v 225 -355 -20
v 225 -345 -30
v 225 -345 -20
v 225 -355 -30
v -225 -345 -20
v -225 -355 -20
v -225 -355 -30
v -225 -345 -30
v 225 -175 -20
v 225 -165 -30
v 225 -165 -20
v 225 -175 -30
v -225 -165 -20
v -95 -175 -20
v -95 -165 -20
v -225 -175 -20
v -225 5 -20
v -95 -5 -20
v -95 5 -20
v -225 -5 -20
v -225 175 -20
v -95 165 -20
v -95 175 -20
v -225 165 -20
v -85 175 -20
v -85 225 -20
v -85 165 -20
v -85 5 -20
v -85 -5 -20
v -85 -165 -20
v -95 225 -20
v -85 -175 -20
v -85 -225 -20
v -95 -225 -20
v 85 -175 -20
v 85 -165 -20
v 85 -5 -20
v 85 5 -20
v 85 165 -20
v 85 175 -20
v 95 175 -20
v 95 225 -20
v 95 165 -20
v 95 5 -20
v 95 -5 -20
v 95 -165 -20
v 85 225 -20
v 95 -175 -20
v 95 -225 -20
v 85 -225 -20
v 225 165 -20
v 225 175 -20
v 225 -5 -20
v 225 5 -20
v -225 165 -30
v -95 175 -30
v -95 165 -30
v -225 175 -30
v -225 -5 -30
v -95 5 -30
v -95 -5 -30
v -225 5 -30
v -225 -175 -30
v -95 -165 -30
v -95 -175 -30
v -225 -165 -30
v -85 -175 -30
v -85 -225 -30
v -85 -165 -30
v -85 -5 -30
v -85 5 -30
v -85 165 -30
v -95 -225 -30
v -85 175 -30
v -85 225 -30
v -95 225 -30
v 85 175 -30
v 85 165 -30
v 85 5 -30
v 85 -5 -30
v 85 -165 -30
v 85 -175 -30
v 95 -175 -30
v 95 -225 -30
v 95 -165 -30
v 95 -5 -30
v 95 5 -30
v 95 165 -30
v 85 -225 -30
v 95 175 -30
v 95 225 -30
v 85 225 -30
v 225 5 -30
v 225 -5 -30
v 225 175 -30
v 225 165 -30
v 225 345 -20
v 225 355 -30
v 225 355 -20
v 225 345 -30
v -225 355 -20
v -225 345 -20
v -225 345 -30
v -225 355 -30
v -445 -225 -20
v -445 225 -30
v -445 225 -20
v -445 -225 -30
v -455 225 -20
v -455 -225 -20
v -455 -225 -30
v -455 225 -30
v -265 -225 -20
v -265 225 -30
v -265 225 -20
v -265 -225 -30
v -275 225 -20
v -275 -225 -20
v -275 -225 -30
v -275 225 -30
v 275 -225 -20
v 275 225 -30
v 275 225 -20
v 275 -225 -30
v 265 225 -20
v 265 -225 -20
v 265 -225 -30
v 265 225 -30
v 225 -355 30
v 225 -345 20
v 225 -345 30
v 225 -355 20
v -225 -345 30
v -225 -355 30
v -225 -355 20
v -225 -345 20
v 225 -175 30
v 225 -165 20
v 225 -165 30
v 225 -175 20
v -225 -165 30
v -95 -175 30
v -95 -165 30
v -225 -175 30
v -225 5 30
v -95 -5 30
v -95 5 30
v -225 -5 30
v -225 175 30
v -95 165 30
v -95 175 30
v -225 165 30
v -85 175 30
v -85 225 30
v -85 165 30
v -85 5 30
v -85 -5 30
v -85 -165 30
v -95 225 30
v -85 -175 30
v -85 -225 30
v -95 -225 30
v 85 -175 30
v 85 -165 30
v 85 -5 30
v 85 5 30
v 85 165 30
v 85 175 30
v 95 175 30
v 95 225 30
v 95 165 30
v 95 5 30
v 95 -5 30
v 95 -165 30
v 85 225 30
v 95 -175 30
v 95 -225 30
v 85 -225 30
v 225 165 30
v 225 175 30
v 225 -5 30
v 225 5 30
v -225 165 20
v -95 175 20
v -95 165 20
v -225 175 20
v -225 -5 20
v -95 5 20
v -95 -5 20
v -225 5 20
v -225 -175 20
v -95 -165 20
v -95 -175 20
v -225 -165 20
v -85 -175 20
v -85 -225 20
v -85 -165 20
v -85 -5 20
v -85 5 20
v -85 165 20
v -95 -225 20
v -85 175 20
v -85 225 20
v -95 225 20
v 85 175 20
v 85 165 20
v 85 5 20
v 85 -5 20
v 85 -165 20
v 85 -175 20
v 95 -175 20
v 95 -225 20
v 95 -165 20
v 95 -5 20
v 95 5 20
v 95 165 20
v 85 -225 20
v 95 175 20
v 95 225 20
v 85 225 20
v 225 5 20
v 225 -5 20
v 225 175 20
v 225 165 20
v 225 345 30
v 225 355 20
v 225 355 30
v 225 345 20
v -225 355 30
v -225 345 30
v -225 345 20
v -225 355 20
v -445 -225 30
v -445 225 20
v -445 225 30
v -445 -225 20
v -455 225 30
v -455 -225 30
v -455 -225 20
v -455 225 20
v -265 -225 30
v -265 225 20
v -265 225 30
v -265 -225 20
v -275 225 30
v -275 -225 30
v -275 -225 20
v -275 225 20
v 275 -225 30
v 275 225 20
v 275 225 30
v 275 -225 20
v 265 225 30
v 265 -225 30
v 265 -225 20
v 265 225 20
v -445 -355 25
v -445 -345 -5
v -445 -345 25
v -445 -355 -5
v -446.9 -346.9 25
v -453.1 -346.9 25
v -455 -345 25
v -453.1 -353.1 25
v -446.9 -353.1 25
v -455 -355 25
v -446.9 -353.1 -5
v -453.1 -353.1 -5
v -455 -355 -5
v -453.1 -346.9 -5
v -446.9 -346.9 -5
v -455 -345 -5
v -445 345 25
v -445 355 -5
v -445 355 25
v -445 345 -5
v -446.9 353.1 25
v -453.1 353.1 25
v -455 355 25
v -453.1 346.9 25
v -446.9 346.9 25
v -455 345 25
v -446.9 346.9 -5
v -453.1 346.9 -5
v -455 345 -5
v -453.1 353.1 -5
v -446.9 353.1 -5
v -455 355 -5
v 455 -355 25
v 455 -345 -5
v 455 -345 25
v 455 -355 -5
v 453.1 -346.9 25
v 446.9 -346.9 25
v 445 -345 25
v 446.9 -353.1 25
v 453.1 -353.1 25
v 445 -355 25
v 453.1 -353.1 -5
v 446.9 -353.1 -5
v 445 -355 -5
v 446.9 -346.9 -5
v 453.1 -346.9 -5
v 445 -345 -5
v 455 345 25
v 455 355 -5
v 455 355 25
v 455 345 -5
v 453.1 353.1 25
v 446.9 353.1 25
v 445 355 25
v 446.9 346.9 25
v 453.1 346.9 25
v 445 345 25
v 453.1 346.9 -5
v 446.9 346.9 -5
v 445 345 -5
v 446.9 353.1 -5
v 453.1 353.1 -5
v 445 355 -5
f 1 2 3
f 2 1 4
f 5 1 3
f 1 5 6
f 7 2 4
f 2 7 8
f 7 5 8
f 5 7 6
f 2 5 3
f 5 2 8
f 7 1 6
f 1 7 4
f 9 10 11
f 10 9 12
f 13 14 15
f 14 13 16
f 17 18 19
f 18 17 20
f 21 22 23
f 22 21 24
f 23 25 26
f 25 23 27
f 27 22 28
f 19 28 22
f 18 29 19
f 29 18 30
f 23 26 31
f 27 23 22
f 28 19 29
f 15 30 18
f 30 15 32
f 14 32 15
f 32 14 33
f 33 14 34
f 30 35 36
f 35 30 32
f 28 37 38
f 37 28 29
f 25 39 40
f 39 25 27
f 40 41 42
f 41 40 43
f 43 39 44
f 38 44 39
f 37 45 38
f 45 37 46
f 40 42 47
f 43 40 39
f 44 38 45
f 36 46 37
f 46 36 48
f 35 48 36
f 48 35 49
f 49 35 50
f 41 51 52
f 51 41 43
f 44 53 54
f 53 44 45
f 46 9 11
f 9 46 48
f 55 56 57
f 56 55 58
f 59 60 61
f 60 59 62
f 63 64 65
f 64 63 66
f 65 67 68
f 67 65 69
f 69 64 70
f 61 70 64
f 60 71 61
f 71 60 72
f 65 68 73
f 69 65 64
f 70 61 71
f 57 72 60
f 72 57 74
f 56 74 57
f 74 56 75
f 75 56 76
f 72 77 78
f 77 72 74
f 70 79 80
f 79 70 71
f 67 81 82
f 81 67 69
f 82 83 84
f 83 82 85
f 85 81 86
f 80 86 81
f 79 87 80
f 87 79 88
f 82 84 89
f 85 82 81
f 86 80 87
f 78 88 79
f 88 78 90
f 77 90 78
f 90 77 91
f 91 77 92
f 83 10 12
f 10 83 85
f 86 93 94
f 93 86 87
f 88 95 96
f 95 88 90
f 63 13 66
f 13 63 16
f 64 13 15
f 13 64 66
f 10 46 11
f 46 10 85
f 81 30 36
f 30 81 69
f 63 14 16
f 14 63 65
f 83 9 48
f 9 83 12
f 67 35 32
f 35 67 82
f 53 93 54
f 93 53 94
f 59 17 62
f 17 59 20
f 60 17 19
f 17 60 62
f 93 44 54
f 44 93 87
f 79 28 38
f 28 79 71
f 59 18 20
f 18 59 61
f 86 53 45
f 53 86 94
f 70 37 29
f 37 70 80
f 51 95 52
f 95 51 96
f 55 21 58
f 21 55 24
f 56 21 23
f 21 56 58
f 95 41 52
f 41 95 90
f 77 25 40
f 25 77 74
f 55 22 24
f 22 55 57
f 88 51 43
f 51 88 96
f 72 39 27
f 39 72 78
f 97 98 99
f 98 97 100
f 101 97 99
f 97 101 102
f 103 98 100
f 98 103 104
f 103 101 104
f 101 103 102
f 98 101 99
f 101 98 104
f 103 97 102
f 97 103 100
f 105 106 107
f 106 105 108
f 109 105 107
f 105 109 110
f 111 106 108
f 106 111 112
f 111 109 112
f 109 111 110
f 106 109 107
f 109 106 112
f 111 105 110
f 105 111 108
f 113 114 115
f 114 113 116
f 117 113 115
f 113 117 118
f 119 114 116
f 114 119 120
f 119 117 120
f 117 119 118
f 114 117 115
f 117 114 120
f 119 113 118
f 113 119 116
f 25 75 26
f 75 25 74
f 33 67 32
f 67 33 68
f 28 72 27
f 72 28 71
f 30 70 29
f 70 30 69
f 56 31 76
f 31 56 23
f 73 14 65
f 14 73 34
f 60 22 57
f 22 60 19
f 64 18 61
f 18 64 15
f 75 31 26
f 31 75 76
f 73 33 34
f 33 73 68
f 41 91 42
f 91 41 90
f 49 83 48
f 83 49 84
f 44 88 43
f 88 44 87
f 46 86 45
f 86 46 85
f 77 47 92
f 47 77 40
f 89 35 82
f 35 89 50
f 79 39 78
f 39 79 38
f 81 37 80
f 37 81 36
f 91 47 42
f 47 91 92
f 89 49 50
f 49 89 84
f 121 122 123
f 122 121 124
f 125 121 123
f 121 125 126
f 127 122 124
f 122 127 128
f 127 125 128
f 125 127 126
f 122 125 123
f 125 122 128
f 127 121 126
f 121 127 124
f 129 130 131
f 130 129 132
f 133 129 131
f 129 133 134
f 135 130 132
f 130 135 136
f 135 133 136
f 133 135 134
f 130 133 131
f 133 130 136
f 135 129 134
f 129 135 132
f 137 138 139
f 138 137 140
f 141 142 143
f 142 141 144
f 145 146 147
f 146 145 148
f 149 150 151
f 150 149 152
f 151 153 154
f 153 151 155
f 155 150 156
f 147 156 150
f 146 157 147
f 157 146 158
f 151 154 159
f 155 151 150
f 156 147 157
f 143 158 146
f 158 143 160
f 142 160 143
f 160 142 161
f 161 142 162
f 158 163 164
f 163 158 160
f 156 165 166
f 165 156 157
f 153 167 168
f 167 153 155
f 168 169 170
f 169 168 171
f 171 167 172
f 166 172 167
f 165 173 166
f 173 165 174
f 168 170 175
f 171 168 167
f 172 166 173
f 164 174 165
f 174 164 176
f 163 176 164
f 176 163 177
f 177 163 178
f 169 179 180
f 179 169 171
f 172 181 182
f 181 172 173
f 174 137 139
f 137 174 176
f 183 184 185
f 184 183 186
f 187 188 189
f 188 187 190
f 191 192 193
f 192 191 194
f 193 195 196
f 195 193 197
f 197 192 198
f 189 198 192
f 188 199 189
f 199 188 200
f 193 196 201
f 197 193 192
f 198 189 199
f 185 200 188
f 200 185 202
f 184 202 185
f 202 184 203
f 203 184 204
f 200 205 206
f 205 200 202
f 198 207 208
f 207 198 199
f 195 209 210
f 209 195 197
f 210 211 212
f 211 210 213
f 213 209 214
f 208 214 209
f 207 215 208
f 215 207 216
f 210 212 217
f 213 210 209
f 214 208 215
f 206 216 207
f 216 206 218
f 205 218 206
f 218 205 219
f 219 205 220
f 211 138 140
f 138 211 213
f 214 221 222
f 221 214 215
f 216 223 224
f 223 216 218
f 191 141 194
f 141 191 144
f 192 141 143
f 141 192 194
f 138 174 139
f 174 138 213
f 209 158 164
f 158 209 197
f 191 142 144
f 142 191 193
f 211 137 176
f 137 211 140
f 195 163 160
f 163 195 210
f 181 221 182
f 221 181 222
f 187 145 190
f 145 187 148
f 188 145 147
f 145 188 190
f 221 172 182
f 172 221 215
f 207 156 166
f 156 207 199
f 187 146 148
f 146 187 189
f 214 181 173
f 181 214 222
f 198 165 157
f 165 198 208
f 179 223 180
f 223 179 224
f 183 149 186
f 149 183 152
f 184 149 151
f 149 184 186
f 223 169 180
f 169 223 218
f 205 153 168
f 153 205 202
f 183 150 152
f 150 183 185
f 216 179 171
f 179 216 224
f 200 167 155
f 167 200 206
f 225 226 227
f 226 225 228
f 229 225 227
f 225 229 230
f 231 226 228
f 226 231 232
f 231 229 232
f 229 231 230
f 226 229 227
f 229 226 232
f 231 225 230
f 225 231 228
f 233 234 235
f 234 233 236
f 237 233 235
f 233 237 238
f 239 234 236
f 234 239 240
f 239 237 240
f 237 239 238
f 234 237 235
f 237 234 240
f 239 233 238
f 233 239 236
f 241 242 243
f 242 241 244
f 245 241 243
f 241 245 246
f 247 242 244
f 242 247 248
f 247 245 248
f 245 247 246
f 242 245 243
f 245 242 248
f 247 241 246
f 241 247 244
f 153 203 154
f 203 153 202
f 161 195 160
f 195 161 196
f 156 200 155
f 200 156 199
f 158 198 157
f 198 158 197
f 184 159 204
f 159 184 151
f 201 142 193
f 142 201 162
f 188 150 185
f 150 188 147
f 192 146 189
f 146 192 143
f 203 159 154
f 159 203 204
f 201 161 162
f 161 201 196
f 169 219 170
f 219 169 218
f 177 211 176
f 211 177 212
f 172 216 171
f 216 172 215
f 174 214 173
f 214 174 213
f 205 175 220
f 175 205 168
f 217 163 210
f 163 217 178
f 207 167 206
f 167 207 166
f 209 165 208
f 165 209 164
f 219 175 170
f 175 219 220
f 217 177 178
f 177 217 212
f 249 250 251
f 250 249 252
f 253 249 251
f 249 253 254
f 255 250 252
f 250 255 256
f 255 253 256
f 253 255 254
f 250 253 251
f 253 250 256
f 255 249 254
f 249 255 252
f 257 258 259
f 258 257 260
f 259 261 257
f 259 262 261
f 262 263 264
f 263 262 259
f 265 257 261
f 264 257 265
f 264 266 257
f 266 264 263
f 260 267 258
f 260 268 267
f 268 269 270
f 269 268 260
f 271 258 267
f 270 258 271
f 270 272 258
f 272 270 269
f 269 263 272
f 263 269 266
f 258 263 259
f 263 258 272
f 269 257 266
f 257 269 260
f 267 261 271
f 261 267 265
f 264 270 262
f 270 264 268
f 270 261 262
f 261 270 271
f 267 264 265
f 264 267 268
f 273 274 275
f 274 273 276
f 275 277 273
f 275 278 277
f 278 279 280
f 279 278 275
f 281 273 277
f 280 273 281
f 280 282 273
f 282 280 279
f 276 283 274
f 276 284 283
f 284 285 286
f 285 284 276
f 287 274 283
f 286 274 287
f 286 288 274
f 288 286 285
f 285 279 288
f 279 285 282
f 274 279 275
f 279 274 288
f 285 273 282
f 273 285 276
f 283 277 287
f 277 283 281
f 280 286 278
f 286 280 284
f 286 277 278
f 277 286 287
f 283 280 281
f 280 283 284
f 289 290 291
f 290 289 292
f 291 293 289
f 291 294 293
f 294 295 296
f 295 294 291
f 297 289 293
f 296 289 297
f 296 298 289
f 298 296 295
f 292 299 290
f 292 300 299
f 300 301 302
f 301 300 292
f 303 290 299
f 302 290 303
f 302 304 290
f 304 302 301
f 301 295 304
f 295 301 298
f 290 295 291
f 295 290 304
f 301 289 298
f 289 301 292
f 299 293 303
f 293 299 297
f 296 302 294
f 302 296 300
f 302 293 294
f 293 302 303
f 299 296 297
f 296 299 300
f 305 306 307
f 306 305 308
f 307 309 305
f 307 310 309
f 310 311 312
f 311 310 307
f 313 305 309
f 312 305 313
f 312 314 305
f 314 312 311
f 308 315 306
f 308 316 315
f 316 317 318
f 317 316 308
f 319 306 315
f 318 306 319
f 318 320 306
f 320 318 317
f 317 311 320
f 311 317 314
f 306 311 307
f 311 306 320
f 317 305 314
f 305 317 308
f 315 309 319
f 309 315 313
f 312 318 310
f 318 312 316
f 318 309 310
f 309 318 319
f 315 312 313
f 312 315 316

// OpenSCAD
// Top layer with partial vertical stubs
module cage_layer_top() {
    bar_thick = 10;
    gap = 80;
    layer_h = 50;
    top_stub_h = 30; // Partial height
    rod_hole = 6.2;
    
    // Bottom horizontal frame
    for(y = [-175, -85, 0, 85, 175]) {
        translate([0, y*2, -layer_h/2])
            cube([450, bar_thick, bar_thick], center=true);
    }
    for(x = [-225, -135, -45, 45, 135]) {
        translate([x*2, 0, -layer_h/2])
            cube([bar_thick, 450, bar_thick], center=true);
    }
    
    // Top horizontal frame
    for(y = [-175, -85, 0, 85, 175]) {
        translate([0, y*2, layer_h/2])
            cube([450, bar_thick, bar_thick], center=true);
    }
    for(x = [-225, -135, -45, 45, 135]) {
        translate([x*2, 0, layer_h/2])
            cube([bar_thick, 450, bar_thick], center=true);
    }
    
    // Vertical corner stubs (shorter, rod accessible from top)
    corners = [[-225, -175], [-225, 175], [225, -175], [225, 175]];
    for(c = corners) {
        translate([c[0]*2, c[1]*2, layer_h/2 - top_stub_h/2])
        difference() {
            cube([bar_thick, bar_thick, top_stub_h], center=true);
            translate([0, 0, 0])
                cube([rod_hole, rod_hole, top_stub_h+0.1], center=true);
        }
    }
}

cage_layer_top();
